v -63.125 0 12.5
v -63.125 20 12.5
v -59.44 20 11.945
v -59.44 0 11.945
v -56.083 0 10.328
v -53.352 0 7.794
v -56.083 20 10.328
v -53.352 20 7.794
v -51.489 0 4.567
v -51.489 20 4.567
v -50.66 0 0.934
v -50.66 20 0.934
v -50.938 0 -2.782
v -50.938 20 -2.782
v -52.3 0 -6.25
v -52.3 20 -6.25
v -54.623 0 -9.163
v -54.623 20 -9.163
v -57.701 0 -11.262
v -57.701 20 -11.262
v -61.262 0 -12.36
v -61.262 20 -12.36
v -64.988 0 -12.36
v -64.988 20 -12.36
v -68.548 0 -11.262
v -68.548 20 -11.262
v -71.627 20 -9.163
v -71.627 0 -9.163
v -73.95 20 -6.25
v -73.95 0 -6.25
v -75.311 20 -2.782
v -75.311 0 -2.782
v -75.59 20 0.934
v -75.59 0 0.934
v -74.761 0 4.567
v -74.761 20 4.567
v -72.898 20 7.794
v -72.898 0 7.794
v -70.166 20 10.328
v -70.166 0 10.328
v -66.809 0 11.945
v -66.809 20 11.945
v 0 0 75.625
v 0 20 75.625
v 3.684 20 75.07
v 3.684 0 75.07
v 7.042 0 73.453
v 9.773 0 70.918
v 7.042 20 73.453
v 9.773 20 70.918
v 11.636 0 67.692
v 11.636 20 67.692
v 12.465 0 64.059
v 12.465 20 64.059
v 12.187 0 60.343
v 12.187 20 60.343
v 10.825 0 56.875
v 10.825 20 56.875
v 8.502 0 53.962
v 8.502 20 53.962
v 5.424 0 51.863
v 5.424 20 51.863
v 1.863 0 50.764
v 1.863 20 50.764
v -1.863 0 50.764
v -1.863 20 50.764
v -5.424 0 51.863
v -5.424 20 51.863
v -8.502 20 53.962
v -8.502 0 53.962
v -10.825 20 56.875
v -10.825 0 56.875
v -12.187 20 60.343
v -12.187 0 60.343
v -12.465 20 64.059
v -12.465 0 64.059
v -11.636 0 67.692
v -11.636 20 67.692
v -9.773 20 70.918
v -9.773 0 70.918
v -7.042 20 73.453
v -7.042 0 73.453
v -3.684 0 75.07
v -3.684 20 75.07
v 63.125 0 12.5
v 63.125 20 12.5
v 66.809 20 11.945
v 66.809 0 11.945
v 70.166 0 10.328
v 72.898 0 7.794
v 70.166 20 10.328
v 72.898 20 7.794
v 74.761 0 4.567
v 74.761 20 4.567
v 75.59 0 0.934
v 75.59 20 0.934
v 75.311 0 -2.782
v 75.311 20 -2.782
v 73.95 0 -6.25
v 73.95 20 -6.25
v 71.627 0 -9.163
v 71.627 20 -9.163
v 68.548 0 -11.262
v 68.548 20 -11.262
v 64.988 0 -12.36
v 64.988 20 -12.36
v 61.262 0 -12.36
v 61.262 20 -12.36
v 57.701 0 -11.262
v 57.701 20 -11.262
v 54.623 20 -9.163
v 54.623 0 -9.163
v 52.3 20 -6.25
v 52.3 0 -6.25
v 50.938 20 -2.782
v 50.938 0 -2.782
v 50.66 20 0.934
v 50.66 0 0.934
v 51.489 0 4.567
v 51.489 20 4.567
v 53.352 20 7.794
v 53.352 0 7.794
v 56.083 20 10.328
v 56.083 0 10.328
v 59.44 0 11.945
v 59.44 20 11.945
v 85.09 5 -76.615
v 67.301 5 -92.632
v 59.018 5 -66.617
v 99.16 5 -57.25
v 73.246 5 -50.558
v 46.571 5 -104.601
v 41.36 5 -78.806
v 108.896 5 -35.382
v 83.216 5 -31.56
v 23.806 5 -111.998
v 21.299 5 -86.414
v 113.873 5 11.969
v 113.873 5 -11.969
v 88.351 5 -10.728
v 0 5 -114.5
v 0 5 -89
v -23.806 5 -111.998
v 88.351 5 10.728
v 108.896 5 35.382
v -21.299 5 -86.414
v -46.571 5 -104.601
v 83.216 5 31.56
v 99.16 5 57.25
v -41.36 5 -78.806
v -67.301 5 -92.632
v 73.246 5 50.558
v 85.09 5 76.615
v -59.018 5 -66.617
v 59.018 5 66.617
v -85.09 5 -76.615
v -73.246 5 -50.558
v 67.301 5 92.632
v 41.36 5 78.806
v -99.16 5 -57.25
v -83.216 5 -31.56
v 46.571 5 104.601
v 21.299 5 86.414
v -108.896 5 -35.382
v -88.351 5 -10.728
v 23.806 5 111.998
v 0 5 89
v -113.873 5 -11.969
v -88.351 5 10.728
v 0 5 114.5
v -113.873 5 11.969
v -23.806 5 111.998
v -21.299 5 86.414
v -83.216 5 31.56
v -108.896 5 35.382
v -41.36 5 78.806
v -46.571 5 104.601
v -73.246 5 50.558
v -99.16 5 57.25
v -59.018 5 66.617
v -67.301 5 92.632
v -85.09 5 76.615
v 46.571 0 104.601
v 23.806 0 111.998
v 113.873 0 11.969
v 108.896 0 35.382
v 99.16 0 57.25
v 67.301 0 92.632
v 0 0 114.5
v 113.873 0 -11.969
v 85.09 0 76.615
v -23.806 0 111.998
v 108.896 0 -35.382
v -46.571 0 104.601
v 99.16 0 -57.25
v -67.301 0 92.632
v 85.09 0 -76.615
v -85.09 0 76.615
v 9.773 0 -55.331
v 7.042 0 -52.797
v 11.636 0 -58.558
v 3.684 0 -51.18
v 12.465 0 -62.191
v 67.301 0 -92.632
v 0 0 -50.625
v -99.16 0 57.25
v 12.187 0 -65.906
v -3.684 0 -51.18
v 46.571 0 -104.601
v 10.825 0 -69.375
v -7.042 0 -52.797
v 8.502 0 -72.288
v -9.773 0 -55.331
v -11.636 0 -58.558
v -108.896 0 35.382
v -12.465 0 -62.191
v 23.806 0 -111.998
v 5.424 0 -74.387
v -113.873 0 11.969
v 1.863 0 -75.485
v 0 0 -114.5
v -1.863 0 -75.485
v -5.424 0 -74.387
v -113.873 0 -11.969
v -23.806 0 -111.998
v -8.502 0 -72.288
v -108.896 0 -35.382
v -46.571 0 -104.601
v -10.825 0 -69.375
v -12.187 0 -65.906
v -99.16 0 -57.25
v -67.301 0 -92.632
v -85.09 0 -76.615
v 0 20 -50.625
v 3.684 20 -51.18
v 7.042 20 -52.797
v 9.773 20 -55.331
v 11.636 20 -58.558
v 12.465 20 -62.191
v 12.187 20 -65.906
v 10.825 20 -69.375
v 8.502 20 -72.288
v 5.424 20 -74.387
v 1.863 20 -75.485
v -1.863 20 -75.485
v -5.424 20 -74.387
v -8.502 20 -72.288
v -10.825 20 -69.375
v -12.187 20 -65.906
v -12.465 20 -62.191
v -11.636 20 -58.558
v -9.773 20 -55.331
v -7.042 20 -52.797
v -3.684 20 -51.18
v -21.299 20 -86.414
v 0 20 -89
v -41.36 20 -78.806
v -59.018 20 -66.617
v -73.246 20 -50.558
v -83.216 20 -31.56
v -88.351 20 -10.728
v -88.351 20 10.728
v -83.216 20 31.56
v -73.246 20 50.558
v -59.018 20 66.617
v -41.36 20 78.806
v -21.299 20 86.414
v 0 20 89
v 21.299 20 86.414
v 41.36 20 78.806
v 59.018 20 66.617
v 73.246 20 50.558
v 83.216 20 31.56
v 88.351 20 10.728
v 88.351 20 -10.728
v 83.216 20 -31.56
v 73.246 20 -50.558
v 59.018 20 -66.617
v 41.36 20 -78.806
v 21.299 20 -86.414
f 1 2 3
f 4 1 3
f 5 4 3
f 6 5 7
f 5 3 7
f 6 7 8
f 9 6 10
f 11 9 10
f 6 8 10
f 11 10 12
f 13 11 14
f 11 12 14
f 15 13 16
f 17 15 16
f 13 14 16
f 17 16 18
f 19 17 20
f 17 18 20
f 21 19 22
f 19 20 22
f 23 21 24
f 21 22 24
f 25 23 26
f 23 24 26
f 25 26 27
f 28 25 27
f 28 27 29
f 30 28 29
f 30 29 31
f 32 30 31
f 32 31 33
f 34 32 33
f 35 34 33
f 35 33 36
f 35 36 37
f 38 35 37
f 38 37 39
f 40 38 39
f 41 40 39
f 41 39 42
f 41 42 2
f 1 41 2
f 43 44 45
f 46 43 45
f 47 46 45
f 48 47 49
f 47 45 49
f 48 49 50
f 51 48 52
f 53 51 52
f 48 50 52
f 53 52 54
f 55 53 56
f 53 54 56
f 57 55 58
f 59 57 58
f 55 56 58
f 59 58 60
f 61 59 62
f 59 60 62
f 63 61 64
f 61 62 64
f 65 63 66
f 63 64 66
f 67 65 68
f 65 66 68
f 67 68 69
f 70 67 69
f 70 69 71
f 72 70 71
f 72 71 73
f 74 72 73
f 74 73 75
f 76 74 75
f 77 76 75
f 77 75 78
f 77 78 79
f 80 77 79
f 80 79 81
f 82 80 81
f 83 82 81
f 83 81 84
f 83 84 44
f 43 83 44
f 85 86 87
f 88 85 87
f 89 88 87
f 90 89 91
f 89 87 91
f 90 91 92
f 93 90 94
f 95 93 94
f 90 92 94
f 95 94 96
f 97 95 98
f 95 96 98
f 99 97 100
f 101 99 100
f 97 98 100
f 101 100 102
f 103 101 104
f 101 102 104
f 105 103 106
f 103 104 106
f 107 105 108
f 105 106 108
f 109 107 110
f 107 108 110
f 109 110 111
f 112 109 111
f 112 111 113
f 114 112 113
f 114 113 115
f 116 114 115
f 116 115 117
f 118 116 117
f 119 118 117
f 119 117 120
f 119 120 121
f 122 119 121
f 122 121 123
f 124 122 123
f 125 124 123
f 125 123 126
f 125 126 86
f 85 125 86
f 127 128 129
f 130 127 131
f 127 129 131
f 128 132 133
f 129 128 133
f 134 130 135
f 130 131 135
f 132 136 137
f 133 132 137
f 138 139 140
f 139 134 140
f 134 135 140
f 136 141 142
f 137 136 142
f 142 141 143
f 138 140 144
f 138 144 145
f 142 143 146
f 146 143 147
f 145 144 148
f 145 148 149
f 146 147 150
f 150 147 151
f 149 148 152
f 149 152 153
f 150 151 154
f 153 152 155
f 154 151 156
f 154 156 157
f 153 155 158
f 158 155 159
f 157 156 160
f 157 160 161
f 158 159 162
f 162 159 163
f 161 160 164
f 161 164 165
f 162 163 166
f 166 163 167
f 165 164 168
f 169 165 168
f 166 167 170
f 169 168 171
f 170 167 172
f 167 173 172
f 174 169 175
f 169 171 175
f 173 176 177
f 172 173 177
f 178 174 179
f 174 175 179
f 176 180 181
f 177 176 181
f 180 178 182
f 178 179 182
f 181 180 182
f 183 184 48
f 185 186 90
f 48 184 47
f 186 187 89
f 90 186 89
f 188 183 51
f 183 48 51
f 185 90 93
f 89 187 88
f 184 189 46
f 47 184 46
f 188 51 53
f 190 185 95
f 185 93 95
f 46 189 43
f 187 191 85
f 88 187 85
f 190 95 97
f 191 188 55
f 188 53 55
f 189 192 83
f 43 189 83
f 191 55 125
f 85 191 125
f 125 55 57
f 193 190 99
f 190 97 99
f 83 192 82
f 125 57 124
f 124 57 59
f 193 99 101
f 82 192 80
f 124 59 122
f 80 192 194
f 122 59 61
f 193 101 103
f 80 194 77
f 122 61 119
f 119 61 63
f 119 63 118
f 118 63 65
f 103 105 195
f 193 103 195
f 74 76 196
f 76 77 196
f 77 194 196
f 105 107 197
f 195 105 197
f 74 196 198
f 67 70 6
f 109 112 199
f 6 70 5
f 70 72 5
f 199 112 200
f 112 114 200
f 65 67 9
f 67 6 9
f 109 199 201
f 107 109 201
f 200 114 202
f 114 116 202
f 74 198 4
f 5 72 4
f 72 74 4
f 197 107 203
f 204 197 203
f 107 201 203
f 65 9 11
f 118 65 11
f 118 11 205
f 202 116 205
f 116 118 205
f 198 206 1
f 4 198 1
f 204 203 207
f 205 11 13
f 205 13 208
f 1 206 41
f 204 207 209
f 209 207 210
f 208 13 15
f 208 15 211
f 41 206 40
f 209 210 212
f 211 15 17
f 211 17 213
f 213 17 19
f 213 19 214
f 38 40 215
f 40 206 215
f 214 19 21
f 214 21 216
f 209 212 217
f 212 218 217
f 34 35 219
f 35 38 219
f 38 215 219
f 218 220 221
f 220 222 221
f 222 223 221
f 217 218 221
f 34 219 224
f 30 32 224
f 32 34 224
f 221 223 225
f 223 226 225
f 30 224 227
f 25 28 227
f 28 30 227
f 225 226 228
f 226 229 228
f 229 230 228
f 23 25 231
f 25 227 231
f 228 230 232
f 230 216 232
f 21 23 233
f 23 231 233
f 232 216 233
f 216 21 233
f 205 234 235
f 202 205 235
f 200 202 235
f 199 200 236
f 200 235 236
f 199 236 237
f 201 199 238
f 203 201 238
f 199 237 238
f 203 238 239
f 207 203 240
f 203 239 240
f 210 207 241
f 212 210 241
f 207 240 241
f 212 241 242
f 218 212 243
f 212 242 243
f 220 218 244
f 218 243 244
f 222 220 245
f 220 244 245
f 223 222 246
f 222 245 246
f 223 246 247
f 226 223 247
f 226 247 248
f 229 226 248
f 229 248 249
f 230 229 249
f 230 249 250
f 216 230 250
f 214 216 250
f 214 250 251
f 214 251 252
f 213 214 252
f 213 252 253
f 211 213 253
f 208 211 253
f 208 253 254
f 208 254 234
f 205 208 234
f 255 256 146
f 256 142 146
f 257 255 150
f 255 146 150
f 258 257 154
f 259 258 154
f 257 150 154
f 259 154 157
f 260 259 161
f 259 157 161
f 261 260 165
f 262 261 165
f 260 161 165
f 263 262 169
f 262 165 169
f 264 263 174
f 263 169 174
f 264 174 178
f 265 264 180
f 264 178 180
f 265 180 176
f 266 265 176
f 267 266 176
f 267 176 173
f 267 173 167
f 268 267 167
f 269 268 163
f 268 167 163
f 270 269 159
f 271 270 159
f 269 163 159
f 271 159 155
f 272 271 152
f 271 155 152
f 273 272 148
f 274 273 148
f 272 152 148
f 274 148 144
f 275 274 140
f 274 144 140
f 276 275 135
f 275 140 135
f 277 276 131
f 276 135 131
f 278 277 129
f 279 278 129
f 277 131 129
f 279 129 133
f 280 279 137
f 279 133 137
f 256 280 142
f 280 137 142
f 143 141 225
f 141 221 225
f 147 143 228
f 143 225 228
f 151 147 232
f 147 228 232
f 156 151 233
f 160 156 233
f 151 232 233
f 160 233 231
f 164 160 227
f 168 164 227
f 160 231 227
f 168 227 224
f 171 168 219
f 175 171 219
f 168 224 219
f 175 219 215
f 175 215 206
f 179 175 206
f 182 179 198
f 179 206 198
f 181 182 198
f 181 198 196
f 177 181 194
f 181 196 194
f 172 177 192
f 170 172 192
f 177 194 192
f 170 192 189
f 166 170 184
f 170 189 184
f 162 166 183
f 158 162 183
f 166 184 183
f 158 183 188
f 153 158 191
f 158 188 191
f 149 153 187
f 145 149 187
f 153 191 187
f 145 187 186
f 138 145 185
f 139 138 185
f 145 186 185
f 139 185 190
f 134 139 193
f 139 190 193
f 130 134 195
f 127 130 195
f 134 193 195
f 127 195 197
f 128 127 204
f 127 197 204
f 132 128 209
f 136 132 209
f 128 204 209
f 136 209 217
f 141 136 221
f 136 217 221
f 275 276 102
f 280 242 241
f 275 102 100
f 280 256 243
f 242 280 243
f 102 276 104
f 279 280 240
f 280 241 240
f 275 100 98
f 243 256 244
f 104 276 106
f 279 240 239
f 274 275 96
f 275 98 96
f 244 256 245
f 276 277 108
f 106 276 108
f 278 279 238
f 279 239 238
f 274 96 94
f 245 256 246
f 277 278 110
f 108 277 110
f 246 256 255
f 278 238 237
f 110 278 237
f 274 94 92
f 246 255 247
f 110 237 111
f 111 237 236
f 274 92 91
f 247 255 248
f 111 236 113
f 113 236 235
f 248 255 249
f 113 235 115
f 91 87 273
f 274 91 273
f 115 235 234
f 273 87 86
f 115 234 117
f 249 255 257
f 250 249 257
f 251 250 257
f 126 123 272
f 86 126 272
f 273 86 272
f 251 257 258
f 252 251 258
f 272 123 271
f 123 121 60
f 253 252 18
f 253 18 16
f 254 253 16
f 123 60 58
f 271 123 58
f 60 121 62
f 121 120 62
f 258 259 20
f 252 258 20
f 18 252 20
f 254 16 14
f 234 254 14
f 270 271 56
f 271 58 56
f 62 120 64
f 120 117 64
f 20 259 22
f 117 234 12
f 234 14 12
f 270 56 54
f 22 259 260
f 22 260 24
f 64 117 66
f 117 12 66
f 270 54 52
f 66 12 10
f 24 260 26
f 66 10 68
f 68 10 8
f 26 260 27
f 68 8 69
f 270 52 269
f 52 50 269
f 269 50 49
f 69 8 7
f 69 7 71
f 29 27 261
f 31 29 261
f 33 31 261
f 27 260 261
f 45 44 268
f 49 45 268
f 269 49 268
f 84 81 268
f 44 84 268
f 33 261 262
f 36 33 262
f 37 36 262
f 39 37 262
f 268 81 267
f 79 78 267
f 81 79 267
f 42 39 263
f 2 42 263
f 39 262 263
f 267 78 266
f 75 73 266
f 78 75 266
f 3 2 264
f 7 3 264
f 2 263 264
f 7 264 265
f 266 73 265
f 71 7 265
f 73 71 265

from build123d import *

# Parameters (mm, degrees)
SKETCH_3_R          = 12.5
CUT_EXTRUDE_1_DEPTH = 164.157898981


with BuildPart() as part:
    # 草圖2 → 旋轉1 (revolve)
    with BuildSketch(Plane.XY, mode=Mode.PRIVATE) as revolve_1_sk:
        Polygon((0, 0), (0, 20), (89, 20), (89, 5), (114.5, 5), (114.5, 0), align=None)
    revolve(revolve_1_sk.sketch.rotate(Axis((0, 0, 0), (0, 1, 0)), 90), axis=Axis((0, 0, 0), (0, 1, 0)))

    # 草圖3 → 除料-伸長1 (cut, through all)
    with BuildSketch(Plane(origin=(0, 20, 0), x_dir=(1, 0, 0), z_dir=(0, 1, 0))):
        with Locations(Location((0, 63.124852982, 0), (0, 0, 270))):
            Circle(SKETCH_3_R)
        with Locations(Location((63.124852982, 0, 0), (0, 0, 270))):
            Circle(SKETCH_3_R)
        with Locations(Location((0, -63.124852982, 0), (0, 0, 270))):
            Circle(SKETCH_3_R)
        with Locations(Location((-63.124852982, 0, 0), (0, 0, 270))):
            Circle(SKETCH_3_R)
    extrude(amount=-CUT_EXTRUDE_1_DEPTH, mode=Mode.SUBTRACT)


solid = part.part
